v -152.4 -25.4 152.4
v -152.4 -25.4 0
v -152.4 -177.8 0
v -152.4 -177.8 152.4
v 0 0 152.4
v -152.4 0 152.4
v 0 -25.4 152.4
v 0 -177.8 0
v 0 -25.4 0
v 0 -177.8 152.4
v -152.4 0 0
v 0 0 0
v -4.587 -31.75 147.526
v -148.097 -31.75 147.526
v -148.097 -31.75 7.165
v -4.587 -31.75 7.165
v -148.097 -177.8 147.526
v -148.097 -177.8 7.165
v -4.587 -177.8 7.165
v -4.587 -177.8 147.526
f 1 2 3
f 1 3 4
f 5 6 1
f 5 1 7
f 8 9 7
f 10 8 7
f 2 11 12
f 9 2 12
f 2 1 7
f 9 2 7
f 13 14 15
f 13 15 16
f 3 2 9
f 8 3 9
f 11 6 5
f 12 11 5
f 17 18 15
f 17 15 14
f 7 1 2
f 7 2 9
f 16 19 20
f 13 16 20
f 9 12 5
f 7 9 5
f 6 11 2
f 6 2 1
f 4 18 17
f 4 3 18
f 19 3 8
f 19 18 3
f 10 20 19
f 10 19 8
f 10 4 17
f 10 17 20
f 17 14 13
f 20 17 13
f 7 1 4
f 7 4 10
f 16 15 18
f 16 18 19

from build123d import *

# Parameters (mm, degrees)
F0_W      = 152.4
F0_H      = 152.4
F1_DEPTH  = 25.4
F1_FACE_W = 152.4
F1_FACE_H = 152.4
F2_DEPTH  = 152.4
F3_W      = 143.51
F3_H      = 140.3604
F4_DEPTH  = 146.05


with BuildPart() as f1:
    # F0 (on Front) → F1 (new body)
    with BuildSketch(Plane.XZ):
        with Locations((-76.2, 76.2)):
            Rectangle(F0_W, F0_H)
    extrude(amount=F1_DEPTH)


with BuildPart() as f2:
    # F1_face (on face) → F2 (new body)
    with BuildSketch(Plane(origin=(-76.2, -25.4, 76.2), x_dir=(1, 0, 0), z_dir=(0, -1, 0))):
        Rectangle(F1_FACE_W, F1_FACE_H)
    extrude(amount=F2_DEPTH)

    # F3 (on face) → F4 (cut)
    with BuildSketch(Plane.XZ.offset(177.8)):
        with Locations((-76.34246, 77.345546)):
            Rectangle(F3_W, F3_H)
    extrude(amount=-F4_DEPTH, mode=Mode.SUBTRACT)


solid = Compound([f1.part, f2.part])
